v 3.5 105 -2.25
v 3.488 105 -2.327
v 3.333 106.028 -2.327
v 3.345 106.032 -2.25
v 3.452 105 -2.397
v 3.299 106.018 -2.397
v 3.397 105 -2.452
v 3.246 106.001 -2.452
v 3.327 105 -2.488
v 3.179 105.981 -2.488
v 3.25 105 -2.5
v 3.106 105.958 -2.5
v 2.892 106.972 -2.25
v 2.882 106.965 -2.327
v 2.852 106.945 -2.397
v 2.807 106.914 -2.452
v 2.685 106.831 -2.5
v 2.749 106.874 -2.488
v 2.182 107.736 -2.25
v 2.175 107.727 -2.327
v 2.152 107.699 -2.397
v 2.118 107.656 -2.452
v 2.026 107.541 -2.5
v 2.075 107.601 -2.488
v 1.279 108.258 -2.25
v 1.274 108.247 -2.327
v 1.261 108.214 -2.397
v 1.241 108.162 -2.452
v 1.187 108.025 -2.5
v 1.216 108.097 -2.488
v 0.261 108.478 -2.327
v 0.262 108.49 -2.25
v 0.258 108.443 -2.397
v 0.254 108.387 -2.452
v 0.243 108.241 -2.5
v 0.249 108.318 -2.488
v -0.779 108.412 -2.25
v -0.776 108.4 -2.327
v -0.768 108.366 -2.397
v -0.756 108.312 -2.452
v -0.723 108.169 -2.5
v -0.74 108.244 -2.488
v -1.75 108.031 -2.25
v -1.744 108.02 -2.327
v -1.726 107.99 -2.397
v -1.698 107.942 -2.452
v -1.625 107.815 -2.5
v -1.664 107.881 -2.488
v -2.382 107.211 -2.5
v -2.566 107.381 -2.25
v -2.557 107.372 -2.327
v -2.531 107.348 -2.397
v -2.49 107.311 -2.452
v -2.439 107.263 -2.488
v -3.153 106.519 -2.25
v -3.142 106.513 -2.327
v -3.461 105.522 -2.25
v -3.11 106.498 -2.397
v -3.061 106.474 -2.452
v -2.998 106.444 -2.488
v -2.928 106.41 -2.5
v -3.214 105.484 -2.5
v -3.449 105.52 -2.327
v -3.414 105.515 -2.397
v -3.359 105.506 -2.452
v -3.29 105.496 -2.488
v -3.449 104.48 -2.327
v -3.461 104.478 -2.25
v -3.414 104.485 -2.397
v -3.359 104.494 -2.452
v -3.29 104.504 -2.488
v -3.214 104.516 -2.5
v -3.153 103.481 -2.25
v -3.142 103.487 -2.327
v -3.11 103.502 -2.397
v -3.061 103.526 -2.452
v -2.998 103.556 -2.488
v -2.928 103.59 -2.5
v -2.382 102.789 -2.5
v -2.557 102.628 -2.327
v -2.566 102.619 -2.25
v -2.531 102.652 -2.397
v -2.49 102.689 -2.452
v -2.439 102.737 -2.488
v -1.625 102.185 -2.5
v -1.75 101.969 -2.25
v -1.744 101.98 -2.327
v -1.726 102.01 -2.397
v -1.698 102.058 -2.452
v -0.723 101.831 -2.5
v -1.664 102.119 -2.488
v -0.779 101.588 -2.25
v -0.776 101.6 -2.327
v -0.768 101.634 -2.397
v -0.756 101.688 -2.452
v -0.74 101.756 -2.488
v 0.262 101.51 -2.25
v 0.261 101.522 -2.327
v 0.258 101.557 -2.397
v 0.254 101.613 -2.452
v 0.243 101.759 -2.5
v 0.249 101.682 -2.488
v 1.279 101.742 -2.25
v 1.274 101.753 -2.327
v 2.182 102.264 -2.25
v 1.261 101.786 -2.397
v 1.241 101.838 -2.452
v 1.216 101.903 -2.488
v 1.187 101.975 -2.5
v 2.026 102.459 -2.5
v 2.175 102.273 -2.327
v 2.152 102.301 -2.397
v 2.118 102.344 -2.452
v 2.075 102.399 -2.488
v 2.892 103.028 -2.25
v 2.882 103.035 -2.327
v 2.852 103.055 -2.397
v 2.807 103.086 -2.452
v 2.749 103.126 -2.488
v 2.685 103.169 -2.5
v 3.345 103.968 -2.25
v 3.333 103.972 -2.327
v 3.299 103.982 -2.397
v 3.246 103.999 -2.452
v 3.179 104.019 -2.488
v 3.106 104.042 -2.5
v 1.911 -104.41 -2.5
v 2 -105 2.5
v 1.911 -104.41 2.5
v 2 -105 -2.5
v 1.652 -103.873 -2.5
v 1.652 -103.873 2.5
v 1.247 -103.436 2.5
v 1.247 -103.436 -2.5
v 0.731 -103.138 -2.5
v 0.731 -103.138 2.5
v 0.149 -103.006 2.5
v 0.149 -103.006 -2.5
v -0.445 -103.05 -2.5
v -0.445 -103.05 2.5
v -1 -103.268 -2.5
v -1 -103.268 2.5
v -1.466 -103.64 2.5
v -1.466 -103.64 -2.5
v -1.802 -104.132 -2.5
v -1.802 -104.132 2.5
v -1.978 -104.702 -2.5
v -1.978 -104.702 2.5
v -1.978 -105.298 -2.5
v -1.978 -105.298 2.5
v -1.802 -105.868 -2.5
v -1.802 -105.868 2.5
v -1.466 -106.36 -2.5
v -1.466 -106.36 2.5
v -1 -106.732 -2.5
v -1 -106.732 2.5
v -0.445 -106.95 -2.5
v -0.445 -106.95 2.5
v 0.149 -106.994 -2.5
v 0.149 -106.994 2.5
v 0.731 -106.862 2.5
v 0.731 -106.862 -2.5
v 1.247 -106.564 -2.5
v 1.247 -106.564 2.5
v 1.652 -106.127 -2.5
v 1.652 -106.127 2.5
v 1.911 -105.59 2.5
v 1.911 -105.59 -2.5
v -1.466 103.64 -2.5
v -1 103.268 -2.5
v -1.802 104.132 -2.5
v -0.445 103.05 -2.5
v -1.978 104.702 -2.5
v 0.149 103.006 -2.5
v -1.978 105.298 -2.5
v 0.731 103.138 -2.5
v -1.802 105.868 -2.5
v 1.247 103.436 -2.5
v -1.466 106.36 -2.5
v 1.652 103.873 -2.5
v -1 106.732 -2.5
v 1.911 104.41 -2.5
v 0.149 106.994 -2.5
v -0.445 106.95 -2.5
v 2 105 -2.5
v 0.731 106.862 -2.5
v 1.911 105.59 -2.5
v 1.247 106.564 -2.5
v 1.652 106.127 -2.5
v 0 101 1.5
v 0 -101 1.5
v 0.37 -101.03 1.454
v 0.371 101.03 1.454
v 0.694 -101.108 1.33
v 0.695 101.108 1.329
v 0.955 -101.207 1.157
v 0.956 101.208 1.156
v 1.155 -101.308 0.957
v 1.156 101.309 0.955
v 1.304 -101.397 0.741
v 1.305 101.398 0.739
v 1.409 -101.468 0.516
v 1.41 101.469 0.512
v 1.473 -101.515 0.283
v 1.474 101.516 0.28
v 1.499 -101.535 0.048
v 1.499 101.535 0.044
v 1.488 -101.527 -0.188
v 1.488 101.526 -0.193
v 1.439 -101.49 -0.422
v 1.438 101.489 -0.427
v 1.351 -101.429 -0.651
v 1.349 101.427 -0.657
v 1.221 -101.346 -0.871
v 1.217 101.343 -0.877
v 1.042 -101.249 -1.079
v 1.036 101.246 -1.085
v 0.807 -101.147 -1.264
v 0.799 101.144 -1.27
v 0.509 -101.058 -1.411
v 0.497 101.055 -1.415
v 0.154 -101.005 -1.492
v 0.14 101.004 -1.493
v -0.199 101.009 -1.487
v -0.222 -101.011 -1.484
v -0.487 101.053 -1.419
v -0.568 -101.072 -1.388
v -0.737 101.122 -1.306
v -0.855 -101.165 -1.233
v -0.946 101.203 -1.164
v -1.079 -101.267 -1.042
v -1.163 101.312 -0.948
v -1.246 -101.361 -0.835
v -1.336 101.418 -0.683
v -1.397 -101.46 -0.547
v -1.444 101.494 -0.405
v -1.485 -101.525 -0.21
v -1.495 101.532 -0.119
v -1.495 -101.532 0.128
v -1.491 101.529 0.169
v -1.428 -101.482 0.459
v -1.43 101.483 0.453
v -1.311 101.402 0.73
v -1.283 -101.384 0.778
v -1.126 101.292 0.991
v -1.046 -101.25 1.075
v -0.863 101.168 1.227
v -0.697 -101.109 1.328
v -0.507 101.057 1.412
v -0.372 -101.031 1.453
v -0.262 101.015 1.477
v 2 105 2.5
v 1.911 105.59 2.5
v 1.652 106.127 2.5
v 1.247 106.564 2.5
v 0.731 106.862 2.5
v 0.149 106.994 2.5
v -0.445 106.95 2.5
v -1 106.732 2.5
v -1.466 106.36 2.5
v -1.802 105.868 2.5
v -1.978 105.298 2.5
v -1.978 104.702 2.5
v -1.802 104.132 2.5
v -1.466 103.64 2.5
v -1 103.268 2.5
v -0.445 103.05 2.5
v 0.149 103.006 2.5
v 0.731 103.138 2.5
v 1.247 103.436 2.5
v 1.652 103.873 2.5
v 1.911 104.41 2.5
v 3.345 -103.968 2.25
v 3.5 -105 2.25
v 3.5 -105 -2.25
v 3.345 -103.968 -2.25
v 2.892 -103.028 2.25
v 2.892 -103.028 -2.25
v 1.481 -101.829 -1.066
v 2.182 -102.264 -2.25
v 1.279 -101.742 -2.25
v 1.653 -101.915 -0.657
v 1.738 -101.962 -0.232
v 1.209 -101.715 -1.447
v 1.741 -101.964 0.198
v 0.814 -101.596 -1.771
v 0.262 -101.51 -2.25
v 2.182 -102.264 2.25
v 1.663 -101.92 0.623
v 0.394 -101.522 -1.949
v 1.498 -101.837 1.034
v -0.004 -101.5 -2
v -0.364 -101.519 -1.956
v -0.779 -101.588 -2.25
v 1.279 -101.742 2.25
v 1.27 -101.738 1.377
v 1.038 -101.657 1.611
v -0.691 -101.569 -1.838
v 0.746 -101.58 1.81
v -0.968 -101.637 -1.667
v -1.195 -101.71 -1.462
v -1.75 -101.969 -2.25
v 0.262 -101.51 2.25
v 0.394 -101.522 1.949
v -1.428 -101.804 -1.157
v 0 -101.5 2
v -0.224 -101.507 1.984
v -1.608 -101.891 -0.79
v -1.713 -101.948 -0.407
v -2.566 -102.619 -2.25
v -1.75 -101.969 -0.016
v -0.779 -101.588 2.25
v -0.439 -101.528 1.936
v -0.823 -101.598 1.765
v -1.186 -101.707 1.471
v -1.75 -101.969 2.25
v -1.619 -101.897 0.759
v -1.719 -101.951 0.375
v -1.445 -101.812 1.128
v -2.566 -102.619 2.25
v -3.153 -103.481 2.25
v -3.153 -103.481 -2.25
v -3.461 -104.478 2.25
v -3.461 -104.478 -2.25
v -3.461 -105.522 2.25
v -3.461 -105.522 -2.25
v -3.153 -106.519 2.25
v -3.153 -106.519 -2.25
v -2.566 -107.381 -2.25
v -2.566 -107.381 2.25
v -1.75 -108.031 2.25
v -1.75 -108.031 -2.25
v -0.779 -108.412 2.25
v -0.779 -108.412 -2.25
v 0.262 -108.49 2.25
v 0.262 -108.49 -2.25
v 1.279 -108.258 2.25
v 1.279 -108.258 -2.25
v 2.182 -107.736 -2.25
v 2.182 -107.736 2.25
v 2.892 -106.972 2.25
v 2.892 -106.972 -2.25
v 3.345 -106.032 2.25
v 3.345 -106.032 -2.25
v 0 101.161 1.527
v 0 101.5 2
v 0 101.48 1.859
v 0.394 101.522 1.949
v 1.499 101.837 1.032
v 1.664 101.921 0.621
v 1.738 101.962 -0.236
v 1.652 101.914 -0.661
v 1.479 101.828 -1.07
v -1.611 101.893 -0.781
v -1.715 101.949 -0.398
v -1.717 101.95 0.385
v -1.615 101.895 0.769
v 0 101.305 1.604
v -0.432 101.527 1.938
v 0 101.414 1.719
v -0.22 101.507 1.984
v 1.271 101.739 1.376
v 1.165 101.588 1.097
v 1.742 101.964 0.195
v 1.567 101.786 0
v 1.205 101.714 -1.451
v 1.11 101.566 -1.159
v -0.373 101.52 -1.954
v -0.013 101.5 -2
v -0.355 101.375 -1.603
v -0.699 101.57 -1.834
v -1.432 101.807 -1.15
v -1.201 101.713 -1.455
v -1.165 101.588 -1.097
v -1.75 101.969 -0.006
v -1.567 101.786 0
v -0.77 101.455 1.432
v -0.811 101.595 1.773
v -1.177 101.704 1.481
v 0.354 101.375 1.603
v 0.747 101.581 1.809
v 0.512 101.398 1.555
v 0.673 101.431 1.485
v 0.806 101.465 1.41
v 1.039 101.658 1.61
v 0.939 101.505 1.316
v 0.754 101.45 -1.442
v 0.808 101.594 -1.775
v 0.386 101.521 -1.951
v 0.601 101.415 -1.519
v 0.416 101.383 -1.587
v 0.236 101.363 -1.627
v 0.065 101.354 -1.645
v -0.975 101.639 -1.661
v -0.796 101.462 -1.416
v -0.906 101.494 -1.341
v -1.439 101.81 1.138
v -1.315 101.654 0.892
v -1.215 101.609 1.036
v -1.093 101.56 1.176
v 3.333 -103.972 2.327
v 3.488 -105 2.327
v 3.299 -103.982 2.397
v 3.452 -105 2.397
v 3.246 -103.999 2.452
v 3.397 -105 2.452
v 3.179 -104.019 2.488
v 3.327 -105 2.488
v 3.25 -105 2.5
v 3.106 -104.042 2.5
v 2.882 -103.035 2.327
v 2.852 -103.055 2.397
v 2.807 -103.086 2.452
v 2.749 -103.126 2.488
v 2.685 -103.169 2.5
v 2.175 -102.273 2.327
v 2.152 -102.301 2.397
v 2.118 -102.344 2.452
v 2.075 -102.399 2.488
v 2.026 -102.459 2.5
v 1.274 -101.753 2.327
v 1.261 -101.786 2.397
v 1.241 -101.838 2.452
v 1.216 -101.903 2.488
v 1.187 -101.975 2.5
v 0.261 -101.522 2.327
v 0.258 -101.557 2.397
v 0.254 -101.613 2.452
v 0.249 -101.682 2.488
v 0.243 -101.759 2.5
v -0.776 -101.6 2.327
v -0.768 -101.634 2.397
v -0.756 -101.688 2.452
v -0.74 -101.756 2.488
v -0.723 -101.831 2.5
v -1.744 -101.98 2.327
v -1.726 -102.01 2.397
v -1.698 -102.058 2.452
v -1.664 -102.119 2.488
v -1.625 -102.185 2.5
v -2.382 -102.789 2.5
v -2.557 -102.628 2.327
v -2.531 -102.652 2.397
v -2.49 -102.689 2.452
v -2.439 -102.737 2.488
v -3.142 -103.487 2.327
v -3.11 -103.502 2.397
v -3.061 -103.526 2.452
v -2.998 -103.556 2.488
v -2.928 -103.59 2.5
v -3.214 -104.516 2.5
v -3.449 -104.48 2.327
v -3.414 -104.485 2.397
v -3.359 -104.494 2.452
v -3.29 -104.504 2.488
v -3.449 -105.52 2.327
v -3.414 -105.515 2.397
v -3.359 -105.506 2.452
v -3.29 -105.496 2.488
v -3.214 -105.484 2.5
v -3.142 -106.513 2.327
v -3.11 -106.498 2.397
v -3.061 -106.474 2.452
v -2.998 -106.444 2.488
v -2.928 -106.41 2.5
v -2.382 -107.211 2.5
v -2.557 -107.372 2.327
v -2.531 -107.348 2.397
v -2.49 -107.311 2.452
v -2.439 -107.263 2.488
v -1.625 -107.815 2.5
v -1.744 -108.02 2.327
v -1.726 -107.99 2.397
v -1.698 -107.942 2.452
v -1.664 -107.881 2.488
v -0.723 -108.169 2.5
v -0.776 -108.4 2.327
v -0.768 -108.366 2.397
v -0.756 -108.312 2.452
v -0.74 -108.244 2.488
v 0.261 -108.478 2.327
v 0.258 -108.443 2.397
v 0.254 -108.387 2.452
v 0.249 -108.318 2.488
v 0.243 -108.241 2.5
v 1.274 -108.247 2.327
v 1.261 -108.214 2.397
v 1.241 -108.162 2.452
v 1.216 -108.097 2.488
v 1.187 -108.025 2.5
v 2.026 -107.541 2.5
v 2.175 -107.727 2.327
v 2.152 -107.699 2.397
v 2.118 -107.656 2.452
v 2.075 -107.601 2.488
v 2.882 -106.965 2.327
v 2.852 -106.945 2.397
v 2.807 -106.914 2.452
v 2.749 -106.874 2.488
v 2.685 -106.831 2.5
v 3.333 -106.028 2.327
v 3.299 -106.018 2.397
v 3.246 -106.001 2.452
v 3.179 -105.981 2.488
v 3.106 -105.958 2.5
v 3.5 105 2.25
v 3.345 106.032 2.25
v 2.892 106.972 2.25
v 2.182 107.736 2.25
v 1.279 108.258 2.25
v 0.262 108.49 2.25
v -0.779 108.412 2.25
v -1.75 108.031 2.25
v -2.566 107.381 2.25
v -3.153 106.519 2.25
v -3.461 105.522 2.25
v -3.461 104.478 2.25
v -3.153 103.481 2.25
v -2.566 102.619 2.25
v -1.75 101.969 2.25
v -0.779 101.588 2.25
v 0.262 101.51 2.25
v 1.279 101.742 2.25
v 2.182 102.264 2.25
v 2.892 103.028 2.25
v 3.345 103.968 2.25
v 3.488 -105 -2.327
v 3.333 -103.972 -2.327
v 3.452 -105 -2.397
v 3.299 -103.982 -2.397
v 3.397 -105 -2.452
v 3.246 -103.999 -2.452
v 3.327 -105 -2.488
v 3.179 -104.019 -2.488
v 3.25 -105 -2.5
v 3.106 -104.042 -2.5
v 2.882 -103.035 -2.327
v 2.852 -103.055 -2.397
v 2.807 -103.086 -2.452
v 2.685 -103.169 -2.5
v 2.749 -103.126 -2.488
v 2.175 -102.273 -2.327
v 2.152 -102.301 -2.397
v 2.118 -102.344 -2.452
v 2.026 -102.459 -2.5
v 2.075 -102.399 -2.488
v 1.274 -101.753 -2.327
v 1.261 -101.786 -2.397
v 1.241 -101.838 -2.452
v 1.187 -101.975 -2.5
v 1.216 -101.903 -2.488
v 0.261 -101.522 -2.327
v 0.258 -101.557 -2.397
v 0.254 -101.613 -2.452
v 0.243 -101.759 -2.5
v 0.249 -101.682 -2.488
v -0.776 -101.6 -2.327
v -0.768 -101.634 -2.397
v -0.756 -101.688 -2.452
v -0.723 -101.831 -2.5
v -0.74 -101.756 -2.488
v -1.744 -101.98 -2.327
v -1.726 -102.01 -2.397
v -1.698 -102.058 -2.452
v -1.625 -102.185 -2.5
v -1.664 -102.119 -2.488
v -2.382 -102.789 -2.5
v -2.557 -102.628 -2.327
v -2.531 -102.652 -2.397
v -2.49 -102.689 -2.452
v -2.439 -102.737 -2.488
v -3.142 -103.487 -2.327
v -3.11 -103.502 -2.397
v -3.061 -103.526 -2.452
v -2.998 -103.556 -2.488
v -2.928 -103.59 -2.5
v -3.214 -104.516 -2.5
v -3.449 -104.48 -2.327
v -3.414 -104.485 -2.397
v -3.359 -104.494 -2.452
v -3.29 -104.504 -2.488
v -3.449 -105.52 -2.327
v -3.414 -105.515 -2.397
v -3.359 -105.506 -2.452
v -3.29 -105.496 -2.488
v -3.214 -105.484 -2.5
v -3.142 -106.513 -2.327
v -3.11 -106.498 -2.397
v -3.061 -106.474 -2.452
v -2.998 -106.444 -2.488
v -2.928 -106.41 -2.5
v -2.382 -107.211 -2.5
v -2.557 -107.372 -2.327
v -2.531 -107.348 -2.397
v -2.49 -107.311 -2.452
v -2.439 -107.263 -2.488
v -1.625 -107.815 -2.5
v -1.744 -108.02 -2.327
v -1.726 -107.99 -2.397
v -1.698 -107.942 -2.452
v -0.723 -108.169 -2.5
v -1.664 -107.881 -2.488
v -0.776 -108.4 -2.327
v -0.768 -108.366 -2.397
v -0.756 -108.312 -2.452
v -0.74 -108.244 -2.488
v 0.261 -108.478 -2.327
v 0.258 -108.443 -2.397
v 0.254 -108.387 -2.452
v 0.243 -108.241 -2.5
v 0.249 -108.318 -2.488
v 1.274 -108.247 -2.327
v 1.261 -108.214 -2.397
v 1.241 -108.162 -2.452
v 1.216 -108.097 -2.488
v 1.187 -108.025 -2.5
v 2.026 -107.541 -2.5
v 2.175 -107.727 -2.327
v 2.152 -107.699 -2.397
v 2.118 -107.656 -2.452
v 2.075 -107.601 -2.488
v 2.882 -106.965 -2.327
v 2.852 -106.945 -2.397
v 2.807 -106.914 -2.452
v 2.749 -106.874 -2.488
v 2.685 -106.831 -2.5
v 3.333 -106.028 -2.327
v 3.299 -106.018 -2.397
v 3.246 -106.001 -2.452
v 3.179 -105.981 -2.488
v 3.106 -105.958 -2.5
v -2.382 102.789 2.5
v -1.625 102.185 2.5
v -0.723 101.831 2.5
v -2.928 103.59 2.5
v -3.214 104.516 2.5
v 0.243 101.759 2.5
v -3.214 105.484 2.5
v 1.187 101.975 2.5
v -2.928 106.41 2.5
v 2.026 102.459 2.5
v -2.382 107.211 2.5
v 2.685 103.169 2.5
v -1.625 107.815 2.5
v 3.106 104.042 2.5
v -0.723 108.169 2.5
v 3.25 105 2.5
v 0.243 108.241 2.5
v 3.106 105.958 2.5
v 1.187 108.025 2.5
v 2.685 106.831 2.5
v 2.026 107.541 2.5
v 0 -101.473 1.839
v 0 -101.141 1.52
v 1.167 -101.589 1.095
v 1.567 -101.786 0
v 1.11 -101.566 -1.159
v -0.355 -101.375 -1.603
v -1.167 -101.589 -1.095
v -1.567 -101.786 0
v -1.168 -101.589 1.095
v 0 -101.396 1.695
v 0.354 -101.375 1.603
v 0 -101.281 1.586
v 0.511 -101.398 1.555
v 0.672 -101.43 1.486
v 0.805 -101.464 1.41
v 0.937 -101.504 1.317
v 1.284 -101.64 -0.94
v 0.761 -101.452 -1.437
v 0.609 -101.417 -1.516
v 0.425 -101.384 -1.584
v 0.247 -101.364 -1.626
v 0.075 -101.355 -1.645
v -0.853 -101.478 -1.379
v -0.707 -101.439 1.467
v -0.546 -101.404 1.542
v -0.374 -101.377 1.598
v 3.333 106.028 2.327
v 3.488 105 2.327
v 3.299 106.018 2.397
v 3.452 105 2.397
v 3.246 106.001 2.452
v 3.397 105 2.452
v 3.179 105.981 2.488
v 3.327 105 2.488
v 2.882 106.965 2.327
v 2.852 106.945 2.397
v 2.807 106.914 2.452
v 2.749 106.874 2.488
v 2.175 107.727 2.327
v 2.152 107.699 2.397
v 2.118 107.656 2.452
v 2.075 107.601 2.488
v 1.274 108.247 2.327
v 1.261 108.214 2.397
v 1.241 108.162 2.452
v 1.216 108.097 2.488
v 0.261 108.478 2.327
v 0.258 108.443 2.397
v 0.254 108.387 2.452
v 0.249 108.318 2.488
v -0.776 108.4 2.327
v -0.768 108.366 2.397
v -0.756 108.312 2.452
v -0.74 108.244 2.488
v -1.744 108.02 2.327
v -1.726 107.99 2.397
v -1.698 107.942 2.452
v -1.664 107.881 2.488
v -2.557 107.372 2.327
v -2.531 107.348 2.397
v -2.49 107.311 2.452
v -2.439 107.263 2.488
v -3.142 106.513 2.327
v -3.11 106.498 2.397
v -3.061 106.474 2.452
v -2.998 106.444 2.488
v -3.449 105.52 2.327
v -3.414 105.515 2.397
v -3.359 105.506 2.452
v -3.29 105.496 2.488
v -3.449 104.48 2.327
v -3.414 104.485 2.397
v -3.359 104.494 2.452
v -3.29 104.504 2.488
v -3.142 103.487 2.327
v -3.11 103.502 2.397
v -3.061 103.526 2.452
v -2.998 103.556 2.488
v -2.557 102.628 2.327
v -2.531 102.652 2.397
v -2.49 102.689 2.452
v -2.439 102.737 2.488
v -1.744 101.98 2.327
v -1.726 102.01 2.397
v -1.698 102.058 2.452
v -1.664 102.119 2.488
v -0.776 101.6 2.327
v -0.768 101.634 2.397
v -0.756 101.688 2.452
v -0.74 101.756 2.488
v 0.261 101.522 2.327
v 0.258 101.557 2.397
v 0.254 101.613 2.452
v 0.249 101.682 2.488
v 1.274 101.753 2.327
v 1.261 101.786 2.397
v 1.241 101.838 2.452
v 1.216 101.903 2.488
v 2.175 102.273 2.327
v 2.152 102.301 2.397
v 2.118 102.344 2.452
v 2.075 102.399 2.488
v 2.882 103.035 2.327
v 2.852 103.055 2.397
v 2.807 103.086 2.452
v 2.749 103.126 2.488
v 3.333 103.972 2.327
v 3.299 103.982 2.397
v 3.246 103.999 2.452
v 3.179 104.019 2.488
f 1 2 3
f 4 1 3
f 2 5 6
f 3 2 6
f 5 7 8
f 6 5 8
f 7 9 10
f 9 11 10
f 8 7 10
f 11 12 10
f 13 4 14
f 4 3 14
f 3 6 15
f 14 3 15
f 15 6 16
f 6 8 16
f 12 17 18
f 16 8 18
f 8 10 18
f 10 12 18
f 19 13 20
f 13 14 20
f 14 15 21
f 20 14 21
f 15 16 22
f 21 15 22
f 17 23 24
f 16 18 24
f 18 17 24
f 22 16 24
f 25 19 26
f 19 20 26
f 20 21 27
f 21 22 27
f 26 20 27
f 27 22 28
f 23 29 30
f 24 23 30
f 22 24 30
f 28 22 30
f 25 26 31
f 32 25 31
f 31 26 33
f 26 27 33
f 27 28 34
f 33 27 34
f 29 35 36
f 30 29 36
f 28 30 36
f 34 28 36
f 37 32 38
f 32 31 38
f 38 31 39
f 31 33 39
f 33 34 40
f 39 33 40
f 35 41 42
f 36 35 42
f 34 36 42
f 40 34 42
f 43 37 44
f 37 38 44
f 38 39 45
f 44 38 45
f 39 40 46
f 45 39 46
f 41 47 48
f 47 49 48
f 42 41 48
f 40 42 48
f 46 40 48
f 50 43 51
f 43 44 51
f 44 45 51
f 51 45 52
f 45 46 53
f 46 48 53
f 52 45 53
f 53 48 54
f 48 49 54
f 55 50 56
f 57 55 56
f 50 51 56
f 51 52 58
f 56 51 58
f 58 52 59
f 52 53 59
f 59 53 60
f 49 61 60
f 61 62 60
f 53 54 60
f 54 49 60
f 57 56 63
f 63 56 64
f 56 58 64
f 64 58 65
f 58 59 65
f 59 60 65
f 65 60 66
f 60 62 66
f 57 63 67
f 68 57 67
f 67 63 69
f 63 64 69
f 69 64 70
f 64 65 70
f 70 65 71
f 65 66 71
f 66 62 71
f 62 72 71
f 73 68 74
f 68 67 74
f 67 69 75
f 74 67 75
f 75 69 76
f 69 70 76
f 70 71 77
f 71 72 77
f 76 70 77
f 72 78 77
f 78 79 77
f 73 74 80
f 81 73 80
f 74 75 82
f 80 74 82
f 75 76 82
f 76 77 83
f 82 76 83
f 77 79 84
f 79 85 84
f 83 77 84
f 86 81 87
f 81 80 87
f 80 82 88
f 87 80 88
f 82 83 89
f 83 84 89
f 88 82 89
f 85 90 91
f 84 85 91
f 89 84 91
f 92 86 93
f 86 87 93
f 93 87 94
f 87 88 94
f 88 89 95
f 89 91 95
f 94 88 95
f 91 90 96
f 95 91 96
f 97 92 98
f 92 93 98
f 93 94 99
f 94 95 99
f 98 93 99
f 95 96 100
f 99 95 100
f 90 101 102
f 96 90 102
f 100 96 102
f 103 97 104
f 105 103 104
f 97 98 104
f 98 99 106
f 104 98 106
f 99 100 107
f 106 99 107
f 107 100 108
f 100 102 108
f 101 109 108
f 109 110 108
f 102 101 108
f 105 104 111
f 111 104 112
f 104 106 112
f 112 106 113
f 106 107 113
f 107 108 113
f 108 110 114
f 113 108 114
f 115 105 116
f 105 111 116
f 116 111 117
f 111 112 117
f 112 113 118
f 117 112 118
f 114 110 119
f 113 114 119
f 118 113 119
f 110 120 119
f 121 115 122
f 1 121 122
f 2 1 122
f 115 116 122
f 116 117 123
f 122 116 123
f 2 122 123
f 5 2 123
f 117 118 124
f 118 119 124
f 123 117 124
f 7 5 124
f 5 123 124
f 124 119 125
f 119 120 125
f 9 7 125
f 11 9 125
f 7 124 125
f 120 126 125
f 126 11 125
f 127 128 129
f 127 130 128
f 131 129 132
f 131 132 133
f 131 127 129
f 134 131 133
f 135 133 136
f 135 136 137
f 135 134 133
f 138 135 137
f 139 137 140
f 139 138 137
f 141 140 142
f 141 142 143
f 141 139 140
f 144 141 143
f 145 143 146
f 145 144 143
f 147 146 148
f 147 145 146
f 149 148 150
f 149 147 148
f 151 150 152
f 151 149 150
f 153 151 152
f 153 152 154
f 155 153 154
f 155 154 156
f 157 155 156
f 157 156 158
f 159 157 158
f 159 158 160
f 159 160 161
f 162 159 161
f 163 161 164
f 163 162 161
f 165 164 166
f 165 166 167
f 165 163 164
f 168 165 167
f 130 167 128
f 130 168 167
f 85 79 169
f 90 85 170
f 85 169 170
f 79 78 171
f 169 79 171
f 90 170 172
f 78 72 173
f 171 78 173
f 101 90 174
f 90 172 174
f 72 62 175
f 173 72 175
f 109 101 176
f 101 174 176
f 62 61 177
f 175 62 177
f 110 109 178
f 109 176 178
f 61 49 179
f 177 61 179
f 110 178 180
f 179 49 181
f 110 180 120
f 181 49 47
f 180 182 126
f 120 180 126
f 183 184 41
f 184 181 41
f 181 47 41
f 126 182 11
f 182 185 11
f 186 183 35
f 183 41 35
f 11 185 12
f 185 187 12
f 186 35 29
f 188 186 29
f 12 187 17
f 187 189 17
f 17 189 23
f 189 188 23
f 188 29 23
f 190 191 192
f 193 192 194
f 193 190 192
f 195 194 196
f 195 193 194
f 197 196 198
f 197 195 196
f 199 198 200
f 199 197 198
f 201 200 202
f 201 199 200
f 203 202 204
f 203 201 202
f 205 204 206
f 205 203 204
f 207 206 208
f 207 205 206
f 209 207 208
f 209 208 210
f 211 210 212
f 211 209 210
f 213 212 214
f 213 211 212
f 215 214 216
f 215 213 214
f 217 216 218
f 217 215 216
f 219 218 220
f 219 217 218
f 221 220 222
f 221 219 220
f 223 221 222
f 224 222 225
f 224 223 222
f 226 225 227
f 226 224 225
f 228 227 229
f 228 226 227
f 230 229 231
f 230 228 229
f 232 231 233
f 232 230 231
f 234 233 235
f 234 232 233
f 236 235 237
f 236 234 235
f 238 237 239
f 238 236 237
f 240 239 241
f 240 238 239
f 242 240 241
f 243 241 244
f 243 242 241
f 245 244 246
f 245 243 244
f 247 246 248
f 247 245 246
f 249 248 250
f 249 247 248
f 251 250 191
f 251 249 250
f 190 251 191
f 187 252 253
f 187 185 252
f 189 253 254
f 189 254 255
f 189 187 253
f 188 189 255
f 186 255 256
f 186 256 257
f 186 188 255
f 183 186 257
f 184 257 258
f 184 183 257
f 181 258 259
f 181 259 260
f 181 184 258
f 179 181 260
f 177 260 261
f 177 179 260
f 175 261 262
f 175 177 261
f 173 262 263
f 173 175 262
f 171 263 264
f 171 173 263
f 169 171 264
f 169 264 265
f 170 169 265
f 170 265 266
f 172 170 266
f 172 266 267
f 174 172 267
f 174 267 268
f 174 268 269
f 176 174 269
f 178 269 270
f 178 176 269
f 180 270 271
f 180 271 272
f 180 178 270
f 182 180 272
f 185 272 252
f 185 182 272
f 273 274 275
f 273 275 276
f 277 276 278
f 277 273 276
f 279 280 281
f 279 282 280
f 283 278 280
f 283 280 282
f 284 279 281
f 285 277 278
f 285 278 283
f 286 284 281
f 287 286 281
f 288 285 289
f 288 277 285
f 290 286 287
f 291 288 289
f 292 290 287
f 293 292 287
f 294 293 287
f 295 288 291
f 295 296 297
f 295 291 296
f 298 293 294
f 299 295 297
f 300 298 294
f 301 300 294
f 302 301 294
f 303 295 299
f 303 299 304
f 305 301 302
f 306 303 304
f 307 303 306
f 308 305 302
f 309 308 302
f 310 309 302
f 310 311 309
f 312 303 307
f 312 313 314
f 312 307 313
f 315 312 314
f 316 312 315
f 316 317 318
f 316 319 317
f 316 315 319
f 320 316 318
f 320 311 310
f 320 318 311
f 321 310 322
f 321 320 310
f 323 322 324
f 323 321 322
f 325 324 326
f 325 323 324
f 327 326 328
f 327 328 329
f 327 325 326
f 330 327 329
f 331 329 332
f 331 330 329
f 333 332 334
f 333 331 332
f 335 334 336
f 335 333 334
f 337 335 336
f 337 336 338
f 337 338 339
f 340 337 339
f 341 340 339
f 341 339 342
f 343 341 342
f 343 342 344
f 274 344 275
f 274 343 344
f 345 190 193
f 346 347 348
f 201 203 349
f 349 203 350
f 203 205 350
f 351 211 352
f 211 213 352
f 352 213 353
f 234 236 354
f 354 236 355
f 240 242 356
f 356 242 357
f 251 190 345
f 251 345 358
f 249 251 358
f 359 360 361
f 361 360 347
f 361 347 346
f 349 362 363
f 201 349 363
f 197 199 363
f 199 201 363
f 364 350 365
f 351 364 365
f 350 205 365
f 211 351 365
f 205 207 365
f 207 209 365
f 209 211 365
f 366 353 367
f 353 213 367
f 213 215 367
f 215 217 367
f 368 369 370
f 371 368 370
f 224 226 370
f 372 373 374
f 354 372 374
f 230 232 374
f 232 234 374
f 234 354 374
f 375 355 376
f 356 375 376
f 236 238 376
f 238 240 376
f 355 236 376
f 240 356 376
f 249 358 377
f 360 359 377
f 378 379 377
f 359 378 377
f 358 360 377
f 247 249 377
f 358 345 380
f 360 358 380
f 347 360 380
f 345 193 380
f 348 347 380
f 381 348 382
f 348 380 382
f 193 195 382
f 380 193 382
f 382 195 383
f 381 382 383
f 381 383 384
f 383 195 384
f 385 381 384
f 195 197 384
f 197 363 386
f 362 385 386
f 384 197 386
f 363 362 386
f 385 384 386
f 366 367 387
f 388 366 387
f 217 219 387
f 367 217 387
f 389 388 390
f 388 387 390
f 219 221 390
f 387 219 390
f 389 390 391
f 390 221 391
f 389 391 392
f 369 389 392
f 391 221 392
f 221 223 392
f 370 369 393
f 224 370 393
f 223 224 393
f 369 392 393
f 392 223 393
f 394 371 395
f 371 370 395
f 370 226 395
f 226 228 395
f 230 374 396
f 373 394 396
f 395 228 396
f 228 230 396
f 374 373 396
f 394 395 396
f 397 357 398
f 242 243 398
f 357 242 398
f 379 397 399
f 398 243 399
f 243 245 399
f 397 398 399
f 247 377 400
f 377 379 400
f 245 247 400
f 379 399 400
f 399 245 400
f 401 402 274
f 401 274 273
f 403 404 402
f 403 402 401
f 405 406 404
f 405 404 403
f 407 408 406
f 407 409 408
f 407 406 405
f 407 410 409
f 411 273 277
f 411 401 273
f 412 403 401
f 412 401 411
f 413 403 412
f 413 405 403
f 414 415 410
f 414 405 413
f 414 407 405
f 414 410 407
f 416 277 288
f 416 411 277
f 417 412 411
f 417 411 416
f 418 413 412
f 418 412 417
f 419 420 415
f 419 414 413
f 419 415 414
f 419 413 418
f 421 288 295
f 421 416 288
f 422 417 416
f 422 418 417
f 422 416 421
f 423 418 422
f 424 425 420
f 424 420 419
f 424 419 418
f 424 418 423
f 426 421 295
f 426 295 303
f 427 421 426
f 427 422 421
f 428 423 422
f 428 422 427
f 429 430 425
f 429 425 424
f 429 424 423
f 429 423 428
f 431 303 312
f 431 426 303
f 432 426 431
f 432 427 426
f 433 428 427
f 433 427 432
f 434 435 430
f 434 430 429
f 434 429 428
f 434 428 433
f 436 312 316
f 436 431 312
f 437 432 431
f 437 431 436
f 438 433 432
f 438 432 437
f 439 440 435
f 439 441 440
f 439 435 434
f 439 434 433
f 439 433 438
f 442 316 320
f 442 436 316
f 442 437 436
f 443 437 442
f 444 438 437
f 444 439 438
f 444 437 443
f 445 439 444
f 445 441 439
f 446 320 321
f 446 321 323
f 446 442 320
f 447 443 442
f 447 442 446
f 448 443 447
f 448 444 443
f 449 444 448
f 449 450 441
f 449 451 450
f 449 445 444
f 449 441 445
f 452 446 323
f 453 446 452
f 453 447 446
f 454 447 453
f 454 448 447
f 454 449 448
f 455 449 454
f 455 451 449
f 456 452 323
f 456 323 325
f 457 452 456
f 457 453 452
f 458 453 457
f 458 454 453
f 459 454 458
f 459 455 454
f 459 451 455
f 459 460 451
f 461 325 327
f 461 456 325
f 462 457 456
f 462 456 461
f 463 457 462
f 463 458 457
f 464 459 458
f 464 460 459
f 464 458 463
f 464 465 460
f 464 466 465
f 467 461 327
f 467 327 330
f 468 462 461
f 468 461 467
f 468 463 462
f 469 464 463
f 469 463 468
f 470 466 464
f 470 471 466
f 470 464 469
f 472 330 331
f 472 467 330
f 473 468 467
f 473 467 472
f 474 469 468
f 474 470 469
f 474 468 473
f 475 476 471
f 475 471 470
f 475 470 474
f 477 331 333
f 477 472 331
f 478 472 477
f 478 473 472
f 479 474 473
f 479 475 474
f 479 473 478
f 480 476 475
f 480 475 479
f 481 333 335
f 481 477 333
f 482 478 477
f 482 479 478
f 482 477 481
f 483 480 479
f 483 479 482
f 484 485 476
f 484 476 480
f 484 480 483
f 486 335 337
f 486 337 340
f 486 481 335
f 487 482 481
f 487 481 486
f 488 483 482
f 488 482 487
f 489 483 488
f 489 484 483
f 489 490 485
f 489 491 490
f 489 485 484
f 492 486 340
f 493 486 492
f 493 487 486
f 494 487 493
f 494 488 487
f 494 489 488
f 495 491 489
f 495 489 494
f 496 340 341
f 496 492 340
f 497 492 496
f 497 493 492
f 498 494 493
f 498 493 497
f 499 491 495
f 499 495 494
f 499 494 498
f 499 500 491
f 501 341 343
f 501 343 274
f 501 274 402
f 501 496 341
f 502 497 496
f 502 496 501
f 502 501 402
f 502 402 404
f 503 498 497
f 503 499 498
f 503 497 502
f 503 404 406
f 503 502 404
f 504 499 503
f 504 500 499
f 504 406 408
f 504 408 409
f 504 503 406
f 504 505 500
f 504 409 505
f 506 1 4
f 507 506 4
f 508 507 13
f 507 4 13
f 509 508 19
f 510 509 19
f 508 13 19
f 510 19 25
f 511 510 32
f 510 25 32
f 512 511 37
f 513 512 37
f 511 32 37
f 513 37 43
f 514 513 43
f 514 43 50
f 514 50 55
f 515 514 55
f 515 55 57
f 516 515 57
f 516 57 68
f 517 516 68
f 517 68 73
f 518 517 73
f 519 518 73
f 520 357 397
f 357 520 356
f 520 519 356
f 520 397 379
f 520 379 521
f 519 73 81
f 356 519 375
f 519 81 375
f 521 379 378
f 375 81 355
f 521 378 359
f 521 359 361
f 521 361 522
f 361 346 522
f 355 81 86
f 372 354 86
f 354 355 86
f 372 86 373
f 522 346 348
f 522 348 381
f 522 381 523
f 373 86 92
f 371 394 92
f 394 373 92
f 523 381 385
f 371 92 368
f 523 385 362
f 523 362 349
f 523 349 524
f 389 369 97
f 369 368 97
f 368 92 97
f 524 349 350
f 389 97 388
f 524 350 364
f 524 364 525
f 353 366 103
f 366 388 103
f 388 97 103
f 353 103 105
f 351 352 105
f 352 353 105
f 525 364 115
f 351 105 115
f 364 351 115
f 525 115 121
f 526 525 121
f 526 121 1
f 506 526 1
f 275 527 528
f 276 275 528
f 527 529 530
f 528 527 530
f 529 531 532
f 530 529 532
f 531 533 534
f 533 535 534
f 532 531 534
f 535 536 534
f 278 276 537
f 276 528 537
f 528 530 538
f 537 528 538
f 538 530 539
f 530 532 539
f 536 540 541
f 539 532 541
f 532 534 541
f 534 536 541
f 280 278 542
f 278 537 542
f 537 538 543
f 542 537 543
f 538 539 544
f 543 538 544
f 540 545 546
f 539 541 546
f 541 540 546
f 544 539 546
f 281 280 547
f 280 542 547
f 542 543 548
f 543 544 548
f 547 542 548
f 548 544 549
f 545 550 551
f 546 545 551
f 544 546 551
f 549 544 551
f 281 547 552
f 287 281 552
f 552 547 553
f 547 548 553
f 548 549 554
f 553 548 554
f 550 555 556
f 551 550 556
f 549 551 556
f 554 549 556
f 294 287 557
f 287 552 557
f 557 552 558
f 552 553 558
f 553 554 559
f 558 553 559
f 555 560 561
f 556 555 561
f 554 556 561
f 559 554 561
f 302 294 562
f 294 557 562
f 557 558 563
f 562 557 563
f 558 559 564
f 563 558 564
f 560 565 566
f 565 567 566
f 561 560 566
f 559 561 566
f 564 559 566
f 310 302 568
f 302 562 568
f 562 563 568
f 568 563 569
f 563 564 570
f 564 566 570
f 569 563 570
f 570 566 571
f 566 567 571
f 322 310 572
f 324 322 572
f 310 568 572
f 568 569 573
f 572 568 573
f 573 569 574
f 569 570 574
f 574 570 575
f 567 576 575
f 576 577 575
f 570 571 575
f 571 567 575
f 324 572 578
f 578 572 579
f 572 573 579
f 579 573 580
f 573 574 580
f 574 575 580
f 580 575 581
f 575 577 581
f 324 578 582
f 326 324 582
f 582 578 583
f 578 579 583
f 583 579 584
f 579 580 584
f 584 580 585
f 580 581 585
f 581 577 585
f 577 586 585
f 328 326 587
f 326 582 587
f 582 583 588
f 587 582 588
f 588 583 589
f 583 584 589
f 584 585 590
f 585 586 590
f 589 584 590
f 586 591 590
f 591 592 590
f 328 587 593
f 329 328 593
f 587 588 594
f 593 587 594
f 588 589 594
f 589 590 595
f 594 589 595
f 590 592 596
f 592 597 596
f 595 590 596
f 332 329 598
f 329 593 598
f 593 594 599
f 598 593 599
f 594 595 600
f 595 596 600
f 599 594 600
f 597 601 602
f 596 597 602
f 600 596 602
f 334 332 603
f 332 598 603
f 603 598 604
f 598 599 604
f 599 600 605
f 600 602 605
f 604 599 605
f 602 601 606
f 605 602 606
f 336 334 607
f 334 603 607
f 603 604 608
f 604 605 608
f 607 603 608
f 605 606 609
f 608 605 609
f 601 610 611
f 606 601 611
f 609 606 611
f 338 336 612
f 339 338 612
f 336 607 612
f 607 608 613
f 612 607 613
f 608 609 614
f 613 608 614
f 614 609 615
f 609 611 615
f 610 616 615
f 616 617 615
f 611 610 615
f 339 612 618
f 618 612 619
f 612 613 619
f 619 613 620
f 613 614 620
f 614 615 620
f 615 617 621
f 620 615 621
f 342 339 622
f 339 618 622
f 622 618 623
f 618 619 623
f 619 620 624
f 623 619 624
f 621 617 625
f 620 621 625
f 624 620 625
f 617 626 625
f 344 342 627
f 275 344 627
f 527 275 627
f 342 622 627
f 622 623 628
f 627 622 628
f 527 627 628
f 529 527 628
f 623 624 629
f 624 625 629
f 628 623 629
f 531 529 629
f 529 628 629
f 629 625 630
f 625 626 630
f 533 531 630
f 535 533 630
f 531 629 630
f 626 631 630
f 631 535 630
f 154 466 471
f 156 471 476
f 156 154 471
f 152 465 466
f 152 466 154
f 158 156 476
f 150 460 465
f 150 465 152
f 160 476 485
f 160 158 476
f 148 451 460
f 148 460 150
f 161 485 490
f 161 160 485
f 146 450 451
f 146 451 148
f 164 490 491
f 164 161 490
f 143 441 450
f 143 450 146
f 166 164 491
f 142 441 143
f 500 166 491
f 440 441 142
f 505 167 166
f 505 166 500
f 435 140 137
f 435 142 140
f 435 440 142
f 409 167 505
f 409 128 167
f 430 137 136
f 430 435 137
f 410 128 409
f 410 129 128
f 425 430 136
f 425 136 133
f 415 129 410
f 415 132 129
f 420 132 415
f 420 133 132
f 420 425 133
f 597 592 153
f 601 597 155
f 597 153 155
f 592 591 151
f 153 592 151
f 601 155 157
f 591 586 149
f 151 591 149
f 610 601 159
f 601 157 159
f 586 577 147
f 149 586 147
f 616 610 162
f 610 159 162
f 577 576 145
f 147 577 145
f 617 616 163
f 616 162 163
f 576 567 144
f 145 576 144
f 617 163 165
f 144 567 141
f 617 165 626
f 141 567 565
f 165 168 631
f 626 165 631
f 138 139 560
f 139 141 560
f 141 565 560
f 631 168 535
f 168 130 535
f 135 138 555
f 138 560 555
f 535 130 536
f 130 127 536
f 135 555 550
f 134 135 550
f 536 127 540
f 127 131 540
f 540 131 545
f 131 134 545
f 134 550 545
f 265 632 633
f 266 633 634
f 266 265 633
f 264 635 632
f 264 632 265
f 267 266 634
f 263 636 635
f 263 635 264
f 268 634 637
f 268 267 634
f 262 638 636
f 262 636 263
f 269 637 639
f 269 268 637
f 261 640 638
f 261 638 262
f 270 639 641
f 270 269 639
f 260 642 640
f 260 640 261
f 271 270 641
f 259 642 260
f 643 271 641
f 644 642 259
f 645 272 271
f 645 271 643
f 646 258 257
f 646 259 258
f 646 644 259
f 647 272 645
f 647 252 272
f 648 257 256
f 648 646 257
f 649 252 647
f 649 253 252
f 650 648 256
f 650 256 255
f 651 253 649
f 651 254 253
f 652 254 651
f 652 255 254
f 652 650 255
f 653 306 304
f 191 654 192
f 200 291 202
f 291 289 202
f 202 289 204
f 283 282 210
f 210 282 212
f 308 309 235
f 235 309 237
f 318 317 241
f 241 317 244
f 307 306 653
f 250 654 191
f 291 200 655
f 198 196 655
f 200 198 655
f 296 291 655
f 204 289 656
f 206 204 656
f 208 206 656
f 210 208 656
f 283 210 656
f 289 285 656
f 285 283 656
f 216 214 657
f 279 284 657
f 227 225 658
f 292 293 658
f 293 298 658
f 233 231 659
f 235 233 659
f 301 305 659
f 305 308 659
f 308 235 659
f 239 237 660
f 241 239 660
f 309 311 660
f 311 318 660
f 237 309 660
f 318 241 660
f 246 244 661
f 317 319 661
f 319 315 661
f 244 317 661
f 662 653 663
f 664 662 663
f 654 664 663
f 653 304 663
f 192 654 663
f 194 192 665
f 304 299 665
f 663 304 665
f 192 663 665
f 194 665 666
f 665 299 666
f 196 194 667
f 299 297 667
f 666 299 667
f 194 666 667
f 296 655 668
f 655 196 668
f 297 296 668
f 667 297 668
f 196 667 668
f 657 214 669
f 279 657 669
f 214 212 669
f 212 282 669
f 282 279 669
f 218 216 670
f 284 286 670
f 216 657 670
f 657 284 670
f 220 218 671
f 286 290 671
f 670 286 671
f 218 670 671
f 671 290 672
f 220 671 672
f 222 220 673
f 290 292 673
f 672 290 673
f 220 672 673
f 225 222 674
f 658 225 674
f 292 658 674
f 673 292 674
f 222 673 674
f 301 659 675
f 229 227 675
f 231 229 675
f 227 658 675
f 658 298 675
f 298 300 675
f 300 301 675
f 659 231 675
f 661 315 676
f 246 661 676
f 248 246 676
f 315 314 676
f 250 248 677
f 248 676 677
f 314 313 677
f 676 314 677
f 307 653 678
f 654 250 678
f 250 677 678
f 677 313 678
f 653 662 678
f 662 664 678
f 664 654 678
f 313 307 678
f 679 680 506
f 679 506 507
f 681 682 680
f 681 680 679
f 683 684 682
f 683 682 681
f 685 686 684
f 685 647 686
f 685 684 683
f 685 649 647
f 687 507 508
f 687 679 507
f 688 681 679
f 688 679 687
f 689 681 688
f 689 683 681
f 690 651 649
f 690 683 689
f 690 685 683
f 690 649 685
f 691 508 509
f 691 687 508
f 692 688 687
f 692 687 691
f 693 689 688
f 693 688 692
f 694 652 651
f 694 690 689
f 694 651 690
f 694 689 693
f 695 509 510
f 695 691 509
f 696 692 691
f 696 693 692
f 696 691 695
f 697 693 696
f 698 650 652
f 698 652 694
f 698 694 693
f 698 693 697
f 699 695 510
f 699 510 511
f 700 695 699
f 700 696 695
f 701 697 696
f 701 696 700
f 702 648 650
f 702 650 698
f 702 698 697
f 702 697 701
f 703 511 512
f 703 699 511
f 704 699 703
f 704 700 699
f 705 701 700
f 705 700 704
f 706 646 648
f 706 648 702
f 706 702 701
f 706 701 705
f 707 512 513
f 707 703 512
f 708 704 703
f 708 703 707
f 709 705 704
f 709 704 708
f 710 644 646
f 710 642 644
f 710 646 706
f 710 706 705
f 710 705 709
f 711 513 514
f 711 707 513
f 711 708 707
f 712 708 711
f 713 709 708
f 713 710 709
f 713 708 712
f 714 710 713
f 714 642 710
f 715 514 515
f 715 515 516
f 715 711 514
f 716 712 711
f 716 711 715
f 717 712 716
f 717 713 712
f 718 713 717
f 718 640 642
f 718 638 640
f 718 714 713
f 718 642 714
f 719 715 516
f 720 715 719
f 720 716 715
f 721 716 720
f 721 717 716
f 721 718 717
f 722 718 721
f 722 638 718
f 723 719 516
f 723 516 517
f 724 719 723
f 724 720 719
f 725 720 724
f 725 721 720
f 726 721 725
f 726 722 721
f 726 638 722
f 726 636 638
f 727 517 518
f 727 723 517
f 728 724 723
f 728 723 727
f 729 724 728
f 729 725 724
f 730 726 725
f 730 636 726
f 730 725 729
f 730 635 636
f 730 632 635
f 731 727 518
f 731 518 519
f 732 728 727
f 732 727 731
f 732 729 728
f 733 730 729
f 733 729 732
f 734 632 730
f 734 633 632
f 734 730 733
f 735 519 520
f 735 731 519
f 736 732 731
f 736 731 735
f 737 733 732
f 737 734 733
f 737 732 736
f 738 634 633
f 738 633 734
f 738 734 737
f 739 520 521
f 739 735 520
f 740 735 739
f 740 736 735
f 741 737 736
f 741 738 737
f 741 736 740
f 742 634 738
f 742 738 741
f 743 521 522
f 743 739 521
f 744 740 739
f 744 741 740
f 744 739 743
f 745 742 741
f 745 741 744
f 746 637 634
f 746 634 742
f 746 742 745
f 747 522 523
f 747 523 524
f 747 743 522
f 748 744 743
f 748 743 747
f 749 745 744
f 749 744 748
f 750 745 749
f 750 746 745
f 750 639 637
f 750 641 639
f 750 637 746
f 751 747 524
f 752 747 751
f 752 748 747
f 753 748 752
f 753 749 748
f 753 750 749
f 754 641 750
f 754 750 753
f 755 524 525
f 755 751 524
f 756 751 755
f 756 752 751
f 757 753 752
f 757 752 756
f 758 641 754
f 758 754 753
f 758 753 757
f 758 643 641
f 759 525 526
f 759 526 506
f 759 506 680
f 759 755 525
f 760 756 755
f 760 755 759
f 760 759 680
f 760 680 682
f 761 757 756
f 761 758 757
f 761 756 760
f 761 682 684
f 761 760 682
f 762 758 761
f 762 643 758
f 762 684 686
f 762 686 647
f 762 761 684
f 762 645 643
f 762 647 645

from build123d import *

# Parameters (mm, degrees)
SKETCH1_R           = 1.5
BOSS_EXTRUDE1_DEPTH = 102
SKETCH2_R           = 3.5
SKETCH2_R_2         = 2
BOSS_EXTRUDE2_DEPTH = 2.5
FILLET3_R           = 0.25
FILLET4_R           = 0.5


with BuildPart() as part:
    # Sketch1 → Boss-Extrude1 (new, symmetric)
    with BuildSketch(Plane(origin=(0, 0, 0), x_dir=(1, 0, 0), z_dir=(0, 1, 0))):
        with Locations(Location((0, 0, 0), (0, 0, 270))):
            Circle(SKETCH1_R)
    extrude(amount=BOSS_EXTRUDE1_DEPTH, both=True)

    # Sketch2 → Boss-Extrude2 (add, symmetric)
    # profile 1 of 2: a face of its own
    with BuildSketch(Plane.XY):
        with Locations((0, 105)):
            Circle(SKETCH2_R)
        with Locations((0, 105)):
            Circle(SKETCH2_R_2, mode=Mode.SUBTRACT)
    # profile 2 of 2: a face of its own
    with BuildSketch(Plane.XY):
        with Locations((0, -105)):
            Circle(SKETCH2_R)
        with Locations((0, -105)):
            Circle(SKETCH2_R_2, mode=Mode.SUBTRACT)
    extrude(amount=BOSS_EXTRUDE2_DEPTH, both=True)

    # Fillet3
    fillet3_edges = [part.edges().sort_by_distance(p)[0] for p in [
        (-3.5, -105, -2.5),
        (-3.5, -105, 2.5),
        (-3.5, 105, -2.5),
        (-3.5, 105, 2.5),
    ]]
    fillet(fillet3_edges, radius=FILLET3_R)

    # Fillet4
    fillet4_edges = [part.edges().sort_by_distance(p)[0] for p in [
        (3e-09, -101.5, -1.5),
        (3e-09, 101.5, -1.5),
    ]]
    fillet(fillet4_edges, radius=FILLET4_R)


solid = part.part
